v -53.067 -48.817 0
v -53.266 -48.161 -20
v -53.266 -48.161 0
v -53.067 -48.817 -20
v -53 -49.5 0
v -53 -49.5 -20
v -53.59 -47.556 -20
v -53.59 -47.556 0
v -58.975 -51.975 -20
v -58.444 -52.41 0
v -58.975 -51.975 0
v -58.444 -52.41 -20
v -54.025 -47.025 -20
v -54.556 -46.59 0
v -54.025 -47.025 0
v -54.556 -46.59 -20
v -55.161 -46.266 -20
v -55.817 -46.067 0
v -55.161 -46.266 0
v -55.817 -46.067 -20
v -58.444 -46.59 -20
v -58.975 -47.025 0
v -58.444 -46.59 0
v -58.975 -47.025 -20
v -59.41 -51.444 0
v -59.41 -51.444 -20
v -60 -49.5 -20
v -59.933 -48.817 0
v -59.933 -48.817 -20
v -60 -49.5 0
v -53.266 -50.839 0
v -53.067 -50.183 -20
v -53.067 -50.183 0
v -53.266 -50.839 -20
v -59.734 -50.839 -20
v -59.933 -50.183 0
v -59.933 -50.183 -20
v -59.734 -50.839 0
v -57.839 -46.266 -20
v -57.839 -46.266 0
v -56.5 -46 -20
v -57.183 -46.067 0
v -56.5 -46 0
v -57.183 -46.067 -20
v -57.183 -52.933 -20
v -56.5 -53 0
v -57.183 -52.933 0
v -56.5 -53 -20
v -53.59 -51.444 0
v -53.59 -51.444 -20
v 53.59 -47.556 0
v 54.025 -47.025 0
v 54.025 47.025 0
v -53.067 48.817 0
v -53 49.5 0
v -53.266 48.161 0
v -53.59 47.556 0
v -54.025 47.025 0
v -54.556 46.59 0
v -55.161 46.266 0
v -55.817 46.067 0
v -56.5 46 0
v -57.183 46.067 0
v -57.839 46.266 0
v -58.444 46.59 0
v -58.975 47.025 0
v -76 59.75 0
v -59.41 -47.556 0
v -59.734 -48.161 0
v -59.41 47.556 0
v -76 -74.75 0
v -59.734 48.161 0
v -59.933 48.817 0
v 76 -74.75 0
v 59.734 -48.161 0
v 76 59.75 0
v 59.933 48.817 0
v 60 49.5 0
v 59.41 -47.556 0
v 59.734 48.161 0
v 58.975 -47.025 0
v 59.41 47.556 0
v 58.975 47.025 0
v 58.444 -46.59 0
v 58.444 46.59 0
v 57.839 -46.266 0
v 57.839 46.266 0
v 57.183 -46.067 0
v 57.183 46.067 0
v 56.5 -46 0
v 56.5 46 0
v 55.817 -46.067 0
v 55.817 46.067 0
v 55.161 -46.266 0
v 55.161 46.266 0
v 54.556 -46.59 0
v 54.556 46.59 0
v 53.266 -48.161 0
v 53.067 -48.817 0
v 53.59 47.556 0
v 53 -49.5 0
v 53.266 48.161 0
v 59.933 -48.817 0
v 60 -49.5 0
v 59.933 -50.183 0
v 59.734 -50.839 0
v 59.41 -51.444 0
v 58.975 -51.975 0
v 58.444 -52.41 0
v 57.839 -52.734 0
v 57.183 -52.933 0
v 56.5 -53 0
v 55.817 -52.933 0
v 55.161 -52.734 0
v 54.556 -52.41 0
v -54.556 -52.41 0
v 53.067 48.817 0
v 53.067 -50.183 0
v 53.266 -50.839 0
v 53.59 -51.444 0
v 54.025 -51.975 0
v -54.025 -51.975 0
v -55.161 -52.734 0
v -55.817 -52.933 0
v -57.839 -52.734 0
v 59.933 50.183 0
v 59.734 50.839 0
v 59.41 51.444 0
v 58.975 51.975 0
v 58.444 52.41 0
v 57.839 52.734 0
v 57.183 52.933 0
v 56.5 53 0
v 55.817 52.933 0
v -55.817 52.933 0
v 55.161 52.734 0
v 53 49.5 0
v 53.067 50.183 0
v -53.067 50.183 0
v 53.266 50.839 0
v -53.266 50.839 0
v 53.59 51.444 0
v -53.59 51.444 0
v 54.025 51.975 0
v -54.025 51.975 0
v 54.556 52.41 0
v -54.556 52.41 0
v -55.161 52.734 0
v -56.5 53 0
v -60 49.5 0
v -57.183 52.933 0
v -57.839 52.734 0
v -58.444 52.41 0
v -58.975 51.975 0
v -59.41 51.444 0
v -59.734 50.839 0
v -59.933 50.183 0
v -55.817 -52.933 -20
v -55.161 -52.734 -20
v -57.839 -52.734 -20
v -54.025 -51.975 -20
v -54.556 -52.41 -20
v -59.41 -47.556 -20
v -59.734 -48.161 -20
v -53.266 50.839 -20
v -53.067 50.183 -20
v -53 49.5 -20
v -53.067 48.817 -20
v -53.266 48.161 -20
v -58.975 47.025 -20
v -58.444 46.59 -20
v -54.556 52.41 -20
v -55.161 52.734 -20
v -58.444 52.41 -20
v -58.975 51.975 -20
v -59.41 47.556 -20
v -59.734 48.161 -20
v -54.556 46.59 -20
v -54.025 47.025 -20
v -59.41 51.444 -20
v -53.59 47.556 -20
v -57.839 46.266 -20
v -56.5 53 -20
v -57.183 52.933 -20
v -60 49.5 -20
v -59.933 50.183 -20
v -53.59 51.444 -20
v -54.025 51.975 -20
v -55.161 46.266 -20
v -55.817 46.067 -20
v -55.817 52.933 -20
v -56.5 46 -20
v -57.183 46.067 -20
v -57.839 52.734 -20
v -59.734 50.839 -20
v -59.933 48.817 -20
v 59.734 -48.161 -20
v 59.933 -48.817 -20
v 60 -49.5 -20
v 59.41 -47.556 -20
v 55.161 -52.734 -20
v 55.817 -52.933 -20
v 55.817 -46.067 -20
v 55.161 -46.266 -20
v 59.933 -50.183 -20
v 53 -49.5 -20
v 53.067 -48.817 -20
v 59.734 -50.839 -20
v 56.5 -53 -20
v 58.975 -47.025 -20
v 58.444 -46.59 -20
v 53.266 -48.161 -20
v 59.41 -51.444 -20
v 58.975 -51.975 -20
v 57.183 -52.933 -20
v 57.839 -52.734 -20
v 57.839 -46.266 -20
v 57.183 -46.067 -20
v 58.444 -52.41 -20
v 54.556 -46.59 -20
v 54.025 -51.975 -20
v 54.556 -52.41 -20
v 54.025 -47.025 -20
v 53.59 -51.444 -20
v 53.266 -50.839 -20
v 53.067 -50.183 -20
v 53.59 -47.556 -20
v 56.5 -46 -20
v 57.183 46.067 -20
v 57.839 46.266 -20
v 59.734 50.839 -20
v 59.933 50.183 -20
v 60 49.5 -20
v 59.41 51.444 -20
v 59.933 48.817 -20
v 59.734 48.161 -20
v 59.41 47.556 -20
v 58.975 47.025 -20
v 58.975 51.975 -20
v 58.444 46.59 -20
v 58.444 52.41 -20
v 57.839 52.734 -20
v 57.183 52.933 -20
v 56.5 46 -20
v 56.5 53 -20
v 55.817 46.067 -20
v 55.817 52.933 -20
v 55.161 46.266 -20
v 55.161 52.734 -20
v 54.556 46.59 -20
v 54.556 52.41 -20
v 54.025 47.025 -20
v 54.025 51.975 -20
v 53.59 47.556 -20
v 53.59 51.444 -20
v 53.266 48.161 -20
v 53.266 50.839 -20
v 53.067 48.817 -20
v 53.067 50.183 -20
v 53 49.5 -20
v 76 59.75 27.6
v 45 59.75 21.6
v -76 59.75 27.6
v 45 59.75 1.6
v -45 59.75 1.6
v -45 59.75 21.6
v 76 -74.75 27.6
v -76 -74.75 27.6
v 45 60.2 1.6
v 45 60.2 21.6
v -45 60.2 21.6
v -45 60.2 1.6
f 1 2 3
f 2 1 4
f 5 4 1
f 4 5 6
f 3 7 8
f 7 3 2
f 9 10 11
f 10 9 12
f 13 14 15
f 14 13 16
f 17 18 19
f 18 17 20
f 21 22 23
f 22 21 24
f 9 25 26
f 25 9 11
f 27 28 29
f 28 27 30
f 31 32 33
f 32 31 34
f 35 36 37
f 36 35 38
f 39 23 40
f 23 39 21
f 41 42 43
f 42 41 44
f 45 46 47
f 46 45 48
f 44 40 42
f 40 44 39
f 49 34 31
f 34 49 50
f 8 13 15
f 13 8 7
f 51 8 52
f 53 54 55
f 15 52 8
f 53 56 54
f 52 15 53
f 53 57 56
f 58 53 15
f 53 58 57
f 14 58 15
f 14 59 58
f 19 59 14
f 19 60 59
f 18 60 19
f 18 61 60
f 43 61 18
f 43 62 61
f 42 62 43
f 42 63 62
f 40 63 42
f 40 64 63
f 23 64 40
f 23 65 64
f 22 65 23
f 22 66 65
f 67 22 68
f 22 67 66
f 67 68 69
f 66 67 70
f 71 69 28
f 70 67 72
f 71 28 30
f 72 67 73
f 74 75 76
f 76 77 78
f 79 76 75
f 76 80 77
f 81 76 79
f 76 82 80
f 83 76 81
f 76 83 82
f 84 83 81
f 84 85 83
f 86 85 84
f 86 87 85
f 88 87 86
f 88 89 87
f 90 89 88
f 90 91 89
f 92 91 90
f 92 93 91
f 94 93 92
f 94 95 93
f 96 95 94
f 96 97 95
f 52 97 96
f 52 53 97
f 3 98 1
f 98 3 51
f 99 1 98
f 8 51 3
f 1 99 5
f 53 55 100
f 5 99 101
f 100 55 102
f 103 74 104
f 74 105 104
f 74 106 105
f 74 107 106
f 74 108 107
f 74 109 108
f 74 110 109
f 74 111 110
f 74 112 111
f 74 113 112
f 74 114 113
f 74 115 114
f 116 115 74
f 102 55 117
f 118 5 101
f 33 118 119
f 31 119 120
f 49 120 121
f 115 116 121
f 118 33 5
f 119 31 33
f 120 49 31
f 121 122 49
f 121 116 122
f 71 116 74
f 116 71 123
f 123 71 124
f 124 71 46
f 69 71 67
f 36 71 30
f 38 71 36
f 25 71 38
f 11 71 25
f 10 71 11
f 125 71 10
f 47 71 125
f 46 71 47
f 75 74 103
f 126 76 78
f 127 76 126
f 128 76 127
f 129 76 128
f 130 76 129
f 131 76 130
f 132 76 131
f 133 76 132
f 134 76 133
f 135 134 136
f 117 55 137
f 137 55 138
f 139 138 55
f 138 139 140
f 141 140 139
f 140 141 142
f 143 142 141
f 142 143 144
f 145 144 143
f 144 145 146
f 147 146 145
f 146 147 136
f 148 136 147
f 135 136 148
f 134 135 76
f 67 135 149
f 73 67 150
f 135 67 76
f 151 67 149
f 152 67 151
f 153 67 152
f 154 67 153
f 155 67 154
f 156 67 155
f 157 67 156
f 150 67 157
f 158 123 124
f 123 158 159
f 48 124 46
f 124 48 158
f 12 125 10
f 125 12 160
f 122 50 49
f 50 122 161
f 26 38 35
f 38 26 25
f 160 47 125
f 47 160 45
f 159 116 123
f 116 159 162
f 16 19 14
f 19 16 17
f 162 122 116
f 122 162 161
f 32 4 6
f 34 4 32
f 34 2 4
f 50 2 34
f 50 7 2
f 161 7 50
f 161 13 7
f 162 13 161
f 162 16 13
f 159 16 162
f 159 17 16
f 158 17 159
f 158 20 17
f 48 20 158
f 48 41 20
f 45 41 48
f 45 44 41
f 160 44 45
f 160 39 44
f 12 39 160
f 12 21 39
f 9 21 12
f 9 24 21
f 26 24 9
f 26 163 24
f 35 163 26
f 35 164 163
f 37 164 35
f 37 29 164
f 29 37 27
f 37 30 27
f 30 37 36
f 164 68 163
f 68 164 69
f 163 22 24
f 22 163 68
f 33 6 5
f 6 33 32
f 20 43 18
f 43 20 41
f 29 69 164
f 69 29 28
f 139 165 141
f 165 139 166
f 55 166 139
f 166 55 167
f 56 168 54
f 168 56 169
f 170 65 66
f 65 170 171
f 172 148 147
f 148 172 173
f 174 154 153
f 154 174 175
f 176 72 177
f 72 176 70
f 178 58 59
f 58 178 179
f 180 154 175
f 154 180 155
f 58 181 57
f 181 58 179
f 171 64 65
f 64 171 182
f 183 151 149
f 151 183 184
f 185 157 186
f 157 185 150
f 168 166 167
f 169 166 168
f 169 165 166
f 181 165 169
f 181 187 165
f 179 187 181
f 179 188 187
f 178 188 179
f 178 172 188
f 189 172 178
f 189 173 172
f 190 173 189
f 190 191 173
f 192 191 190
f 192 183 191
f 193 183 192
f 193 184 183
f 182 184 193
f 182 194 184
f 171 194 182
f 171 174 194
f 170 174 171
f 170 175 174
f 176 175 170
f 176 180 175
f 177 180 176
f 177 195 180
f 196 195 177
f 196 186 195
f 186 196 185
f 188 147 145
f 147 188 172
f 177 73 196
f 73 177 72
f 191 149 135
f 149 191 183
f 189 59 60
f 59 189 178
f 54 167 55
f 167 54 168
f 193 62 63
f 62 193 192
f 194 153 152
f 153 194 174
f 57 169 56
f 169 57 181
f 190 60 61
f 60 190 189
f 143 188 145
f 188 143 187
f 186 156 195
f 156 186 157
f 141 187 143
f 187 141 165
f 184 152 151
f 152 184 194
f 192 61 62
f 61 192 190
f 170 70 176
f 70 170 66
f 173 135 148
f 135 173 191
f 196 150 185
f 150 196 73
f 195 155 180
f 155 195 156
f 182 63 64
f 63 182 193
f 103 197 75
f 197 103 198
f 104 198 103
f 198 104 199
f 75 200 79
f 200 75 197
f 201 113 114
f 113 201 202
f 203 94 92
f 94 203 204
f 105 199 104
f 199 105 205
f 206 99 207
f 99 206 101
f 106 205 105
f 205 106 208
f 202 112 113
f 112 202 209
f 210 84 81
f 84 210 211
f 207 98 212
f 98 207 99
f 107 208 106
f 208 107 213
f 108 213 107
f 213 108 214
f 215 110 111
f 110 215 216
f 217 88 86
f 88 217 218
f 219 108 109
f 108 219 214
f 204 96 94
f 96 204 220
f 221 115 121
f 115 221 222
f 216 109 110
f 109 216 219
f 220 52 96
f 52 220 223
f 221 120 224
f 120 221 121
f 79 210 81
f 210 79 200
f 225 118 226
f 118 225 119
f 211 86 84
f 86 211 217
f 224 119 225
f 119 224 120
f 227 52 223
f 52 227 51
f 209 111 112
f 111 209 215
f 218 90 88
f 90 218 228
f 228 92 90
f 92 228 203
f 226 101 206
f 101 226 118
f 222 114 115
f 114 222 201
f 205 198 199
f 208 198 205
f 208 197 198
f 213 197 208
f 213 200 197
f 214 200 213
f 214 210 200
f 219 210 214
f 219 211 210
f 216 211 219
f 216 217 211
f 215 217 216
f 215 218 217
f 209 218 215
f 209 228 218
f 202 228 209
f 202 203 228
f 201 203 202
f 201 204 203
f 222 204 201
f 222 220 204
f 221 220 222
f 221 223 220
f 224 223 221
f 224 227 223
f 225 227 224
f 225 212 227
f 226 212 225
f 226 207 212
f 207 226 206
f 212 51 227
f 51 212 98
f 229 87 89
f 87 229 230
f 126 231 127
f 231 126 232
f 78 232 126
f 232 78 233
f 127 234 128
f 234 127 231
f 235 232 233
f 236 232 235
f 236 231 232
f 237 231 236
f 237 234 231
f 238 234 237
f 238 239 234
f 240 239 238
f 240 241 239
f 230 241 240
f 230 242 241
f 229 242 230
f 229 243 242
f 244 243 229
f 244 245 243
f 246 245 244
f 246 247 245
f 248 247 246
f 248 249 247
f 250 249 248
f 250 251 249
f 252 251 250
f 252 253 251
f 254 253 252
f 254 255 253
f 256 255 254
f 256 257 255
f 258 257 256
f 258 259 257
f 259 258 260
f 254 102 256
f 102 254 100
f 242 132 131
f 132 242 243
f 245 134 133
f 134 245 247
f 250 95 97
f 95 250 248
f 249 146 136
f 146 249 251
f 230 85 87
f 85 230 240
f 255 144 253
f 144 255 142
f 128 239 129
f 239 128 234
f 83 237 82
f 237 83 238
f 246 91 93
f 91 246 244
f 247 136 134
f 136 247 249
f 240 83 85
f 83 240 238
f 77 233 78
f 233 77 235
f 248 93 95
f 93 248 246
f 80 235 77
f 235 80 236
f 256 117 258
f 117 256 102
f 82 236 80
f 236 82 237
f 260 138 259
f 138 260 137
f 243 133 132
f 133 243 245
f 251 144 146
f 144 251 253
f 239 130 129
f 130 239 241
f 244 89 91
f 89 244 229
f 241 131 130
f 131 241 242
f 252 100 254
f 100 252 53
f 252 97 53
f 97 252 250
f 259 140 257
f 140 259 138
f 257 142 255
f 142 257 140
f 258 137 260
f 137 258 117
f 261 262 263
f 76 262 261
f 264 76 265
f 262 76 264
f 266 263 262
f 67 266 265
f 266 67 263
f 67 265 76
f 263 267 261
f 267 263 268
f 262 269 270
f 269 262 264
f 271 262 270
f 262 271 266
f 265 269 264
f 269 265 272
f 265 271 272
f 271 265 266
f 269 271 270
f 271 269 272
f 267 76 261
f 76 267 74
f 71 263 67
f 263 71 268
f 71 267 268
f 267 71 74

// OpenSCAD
//
// ============================================================================
// SteamMachine UM790
// Project Phoenix
//
// Archivo  : um790.scad
// Versión  : 1.0
// Fecha    : 2026-08-03
// Autor    : Pep Ventura (asistido por Claude)
//
// Volumen mecánico de referencia del Minisforum UM790 Pro para el
// ensamblaje virtual v1.
//
// NO ES UNA PIEZA IMPRIMIBLE.
//
// Sistema de coordenadas LOCAL de este módulo:
//   Origen (0,0,0) = centro de la PCB en X/Y, cara inferior de la PCB
//                     (el plano donde apoya sobre los separadores).
//   +X = hacia el lateral derecho de la placa.
//   +Y = hacia la IO trasera (RJ45 / USB / alimentación).
//   +Z = hacia arriba (hacia el disipador).
//
// Componentes representados:
//   - PCB
//   - Disipador (volumen aproximado)
//   - Conectores traseros (volumen aproximado hasta el panel trasero)
//   - Postes de anclaje / separadores
//   - Volumen de seguridad de cableado alrededor de la placa
//
// ============================================================================

include <../../../00_parametros.scad>;

$fn = 32;

part_version = "1.0";


//=============================================================================
// COLORES
//=============================================================================

um790PcbColor    = [0.10,0.45,0.12,1.0];
um790CoolerColor = [0.55,0.55,0.55,1.0];
um790IOColor     = [0.75,0.75,0.75,1.0];
um790SafetyColor = [1.00,0.65,0.00,0.15];


//=============================================================================
// PCB
//=============================================================================

module um790Pcb()
{

    color(um790PcbColor)

    translate([-pcb_width/2,-pcb_depth/2,0])

        cube([
            pcb_width,
            pcb_depth,
            pcb_thickness
        ]);

}


//=============================================================================
// DISIPADOR
//=============================================================================

module um790Cooler()
{

    color(um790CoolerColor)

    translate([
        -um790_cooler_width/2,
        -um790_cooler_depth/2,
        pcb_thickness
    ])

        cube([
            um790_cooler_width,
            um790_cooler_depth,
            um790_cooler_height
        ]);

}


//=============================================================================
// CONECTORES TRASEROS
//
// Bloque situado en el borde +Y de la PCB, extendido hasta alcanzar
// la cara interior del panel trasero (um790_rearIO_depth, calculado
// en 00_parametros.scad a partir de case_depth, wall_thickness y
// pcb_depth).
//=============================================================================

module um790RearIO()
{

    color(um790IOColor)

    translate([
        -um790_rearIO_width/2,
        pcb_depth/2,
        pcb_thickness
    ])

        cube([
            um790_rearIO_width,
            um790_rearIO_depth,
            um790_rearIO_height
        ]);

}


//=============================================================================
// POSTES DE ANCLAJE (SEPARADORES)
//
// Misma posición que openscad/parts/01_bandeja/posts.scad
// (um790_mount_spacing_x/y, um790_post_diameter), pero con la altura
// vigente en este ensamblaje virtual (um790_standoff_height, ver
// 00_parametros.scad y docs/Virtual_Assembly_Report.md respecto a
// la reconciliación pendiente con posts.scad: 6 mm allí).
//
// Se dibujan hacia abajo desde la cara inferior de la PCB (Z=0 local)
// hasta la bandeja, para que cualquier componente que pase por debajo
// de la PCB (p. ej. el pulsador o el USB frontal, si se elevase la
// PCB lo suficiente) se compruebe también contra ellos.
//=============================================================================

module um790MountingPosts()
{

    off_x_local = um790_mount_spacing_x/2;
    off_y_local = um790_mount_spacing_y/2;

    color(um790IOColor)

    for(ix=[-1,1])
    for(iy=[-1,1])

        translate([
            ix*off_x_local,
            iy*off_y_local,
            -um790_standoff_height
        ])

            cylinder(
                d = um790_post_diameter,
                h = um790_standoff_height
            );

}


//=============================================================================
// CUERPO MECÁNICO (para comprobación de colisiones "duras")
//=============================================================================

module um790Body()
{

    union()
    {
        um790Pcb();
        um790Cooler();
        um790RearIO();
        um790MountingPosts();
    }

}


//=============================================================================
// VOLUMEN DE SEGURIDAD DE CABLEADO
//
// Envolvente alrededor de la PCB (lateral izquierdo, lateral derecho
// y borde frontal -Y) reservada para el paso de cableado interno
// (alimentación, ESP32, ventilador). No incluye el borde trasero,
// que ya dispone de su propio volumen de IO.
//=============================================================================

module um790CableKeepout()
{

    color(um790SafetyColor)

    translate([
        -pcb_width/2 - um790_cable_margin,
        -pcb_depth/2 - um790_cable_margin,
        0
    ])

        cube([
            pcb_width + um790_cable_margin*2,
            pcb_depth + um790_cable_margin,
            pcb_thickness + um790_cooler_height
        ]);

}


//=============================================================================
// CONJUNTO COMPLETO (visualización)
//=============================================================================

module um790()
{

    um790Body();

    um790CableKeepout();

}


//=============================================================================
// PREVIEW
//=============================================================================

um790();
